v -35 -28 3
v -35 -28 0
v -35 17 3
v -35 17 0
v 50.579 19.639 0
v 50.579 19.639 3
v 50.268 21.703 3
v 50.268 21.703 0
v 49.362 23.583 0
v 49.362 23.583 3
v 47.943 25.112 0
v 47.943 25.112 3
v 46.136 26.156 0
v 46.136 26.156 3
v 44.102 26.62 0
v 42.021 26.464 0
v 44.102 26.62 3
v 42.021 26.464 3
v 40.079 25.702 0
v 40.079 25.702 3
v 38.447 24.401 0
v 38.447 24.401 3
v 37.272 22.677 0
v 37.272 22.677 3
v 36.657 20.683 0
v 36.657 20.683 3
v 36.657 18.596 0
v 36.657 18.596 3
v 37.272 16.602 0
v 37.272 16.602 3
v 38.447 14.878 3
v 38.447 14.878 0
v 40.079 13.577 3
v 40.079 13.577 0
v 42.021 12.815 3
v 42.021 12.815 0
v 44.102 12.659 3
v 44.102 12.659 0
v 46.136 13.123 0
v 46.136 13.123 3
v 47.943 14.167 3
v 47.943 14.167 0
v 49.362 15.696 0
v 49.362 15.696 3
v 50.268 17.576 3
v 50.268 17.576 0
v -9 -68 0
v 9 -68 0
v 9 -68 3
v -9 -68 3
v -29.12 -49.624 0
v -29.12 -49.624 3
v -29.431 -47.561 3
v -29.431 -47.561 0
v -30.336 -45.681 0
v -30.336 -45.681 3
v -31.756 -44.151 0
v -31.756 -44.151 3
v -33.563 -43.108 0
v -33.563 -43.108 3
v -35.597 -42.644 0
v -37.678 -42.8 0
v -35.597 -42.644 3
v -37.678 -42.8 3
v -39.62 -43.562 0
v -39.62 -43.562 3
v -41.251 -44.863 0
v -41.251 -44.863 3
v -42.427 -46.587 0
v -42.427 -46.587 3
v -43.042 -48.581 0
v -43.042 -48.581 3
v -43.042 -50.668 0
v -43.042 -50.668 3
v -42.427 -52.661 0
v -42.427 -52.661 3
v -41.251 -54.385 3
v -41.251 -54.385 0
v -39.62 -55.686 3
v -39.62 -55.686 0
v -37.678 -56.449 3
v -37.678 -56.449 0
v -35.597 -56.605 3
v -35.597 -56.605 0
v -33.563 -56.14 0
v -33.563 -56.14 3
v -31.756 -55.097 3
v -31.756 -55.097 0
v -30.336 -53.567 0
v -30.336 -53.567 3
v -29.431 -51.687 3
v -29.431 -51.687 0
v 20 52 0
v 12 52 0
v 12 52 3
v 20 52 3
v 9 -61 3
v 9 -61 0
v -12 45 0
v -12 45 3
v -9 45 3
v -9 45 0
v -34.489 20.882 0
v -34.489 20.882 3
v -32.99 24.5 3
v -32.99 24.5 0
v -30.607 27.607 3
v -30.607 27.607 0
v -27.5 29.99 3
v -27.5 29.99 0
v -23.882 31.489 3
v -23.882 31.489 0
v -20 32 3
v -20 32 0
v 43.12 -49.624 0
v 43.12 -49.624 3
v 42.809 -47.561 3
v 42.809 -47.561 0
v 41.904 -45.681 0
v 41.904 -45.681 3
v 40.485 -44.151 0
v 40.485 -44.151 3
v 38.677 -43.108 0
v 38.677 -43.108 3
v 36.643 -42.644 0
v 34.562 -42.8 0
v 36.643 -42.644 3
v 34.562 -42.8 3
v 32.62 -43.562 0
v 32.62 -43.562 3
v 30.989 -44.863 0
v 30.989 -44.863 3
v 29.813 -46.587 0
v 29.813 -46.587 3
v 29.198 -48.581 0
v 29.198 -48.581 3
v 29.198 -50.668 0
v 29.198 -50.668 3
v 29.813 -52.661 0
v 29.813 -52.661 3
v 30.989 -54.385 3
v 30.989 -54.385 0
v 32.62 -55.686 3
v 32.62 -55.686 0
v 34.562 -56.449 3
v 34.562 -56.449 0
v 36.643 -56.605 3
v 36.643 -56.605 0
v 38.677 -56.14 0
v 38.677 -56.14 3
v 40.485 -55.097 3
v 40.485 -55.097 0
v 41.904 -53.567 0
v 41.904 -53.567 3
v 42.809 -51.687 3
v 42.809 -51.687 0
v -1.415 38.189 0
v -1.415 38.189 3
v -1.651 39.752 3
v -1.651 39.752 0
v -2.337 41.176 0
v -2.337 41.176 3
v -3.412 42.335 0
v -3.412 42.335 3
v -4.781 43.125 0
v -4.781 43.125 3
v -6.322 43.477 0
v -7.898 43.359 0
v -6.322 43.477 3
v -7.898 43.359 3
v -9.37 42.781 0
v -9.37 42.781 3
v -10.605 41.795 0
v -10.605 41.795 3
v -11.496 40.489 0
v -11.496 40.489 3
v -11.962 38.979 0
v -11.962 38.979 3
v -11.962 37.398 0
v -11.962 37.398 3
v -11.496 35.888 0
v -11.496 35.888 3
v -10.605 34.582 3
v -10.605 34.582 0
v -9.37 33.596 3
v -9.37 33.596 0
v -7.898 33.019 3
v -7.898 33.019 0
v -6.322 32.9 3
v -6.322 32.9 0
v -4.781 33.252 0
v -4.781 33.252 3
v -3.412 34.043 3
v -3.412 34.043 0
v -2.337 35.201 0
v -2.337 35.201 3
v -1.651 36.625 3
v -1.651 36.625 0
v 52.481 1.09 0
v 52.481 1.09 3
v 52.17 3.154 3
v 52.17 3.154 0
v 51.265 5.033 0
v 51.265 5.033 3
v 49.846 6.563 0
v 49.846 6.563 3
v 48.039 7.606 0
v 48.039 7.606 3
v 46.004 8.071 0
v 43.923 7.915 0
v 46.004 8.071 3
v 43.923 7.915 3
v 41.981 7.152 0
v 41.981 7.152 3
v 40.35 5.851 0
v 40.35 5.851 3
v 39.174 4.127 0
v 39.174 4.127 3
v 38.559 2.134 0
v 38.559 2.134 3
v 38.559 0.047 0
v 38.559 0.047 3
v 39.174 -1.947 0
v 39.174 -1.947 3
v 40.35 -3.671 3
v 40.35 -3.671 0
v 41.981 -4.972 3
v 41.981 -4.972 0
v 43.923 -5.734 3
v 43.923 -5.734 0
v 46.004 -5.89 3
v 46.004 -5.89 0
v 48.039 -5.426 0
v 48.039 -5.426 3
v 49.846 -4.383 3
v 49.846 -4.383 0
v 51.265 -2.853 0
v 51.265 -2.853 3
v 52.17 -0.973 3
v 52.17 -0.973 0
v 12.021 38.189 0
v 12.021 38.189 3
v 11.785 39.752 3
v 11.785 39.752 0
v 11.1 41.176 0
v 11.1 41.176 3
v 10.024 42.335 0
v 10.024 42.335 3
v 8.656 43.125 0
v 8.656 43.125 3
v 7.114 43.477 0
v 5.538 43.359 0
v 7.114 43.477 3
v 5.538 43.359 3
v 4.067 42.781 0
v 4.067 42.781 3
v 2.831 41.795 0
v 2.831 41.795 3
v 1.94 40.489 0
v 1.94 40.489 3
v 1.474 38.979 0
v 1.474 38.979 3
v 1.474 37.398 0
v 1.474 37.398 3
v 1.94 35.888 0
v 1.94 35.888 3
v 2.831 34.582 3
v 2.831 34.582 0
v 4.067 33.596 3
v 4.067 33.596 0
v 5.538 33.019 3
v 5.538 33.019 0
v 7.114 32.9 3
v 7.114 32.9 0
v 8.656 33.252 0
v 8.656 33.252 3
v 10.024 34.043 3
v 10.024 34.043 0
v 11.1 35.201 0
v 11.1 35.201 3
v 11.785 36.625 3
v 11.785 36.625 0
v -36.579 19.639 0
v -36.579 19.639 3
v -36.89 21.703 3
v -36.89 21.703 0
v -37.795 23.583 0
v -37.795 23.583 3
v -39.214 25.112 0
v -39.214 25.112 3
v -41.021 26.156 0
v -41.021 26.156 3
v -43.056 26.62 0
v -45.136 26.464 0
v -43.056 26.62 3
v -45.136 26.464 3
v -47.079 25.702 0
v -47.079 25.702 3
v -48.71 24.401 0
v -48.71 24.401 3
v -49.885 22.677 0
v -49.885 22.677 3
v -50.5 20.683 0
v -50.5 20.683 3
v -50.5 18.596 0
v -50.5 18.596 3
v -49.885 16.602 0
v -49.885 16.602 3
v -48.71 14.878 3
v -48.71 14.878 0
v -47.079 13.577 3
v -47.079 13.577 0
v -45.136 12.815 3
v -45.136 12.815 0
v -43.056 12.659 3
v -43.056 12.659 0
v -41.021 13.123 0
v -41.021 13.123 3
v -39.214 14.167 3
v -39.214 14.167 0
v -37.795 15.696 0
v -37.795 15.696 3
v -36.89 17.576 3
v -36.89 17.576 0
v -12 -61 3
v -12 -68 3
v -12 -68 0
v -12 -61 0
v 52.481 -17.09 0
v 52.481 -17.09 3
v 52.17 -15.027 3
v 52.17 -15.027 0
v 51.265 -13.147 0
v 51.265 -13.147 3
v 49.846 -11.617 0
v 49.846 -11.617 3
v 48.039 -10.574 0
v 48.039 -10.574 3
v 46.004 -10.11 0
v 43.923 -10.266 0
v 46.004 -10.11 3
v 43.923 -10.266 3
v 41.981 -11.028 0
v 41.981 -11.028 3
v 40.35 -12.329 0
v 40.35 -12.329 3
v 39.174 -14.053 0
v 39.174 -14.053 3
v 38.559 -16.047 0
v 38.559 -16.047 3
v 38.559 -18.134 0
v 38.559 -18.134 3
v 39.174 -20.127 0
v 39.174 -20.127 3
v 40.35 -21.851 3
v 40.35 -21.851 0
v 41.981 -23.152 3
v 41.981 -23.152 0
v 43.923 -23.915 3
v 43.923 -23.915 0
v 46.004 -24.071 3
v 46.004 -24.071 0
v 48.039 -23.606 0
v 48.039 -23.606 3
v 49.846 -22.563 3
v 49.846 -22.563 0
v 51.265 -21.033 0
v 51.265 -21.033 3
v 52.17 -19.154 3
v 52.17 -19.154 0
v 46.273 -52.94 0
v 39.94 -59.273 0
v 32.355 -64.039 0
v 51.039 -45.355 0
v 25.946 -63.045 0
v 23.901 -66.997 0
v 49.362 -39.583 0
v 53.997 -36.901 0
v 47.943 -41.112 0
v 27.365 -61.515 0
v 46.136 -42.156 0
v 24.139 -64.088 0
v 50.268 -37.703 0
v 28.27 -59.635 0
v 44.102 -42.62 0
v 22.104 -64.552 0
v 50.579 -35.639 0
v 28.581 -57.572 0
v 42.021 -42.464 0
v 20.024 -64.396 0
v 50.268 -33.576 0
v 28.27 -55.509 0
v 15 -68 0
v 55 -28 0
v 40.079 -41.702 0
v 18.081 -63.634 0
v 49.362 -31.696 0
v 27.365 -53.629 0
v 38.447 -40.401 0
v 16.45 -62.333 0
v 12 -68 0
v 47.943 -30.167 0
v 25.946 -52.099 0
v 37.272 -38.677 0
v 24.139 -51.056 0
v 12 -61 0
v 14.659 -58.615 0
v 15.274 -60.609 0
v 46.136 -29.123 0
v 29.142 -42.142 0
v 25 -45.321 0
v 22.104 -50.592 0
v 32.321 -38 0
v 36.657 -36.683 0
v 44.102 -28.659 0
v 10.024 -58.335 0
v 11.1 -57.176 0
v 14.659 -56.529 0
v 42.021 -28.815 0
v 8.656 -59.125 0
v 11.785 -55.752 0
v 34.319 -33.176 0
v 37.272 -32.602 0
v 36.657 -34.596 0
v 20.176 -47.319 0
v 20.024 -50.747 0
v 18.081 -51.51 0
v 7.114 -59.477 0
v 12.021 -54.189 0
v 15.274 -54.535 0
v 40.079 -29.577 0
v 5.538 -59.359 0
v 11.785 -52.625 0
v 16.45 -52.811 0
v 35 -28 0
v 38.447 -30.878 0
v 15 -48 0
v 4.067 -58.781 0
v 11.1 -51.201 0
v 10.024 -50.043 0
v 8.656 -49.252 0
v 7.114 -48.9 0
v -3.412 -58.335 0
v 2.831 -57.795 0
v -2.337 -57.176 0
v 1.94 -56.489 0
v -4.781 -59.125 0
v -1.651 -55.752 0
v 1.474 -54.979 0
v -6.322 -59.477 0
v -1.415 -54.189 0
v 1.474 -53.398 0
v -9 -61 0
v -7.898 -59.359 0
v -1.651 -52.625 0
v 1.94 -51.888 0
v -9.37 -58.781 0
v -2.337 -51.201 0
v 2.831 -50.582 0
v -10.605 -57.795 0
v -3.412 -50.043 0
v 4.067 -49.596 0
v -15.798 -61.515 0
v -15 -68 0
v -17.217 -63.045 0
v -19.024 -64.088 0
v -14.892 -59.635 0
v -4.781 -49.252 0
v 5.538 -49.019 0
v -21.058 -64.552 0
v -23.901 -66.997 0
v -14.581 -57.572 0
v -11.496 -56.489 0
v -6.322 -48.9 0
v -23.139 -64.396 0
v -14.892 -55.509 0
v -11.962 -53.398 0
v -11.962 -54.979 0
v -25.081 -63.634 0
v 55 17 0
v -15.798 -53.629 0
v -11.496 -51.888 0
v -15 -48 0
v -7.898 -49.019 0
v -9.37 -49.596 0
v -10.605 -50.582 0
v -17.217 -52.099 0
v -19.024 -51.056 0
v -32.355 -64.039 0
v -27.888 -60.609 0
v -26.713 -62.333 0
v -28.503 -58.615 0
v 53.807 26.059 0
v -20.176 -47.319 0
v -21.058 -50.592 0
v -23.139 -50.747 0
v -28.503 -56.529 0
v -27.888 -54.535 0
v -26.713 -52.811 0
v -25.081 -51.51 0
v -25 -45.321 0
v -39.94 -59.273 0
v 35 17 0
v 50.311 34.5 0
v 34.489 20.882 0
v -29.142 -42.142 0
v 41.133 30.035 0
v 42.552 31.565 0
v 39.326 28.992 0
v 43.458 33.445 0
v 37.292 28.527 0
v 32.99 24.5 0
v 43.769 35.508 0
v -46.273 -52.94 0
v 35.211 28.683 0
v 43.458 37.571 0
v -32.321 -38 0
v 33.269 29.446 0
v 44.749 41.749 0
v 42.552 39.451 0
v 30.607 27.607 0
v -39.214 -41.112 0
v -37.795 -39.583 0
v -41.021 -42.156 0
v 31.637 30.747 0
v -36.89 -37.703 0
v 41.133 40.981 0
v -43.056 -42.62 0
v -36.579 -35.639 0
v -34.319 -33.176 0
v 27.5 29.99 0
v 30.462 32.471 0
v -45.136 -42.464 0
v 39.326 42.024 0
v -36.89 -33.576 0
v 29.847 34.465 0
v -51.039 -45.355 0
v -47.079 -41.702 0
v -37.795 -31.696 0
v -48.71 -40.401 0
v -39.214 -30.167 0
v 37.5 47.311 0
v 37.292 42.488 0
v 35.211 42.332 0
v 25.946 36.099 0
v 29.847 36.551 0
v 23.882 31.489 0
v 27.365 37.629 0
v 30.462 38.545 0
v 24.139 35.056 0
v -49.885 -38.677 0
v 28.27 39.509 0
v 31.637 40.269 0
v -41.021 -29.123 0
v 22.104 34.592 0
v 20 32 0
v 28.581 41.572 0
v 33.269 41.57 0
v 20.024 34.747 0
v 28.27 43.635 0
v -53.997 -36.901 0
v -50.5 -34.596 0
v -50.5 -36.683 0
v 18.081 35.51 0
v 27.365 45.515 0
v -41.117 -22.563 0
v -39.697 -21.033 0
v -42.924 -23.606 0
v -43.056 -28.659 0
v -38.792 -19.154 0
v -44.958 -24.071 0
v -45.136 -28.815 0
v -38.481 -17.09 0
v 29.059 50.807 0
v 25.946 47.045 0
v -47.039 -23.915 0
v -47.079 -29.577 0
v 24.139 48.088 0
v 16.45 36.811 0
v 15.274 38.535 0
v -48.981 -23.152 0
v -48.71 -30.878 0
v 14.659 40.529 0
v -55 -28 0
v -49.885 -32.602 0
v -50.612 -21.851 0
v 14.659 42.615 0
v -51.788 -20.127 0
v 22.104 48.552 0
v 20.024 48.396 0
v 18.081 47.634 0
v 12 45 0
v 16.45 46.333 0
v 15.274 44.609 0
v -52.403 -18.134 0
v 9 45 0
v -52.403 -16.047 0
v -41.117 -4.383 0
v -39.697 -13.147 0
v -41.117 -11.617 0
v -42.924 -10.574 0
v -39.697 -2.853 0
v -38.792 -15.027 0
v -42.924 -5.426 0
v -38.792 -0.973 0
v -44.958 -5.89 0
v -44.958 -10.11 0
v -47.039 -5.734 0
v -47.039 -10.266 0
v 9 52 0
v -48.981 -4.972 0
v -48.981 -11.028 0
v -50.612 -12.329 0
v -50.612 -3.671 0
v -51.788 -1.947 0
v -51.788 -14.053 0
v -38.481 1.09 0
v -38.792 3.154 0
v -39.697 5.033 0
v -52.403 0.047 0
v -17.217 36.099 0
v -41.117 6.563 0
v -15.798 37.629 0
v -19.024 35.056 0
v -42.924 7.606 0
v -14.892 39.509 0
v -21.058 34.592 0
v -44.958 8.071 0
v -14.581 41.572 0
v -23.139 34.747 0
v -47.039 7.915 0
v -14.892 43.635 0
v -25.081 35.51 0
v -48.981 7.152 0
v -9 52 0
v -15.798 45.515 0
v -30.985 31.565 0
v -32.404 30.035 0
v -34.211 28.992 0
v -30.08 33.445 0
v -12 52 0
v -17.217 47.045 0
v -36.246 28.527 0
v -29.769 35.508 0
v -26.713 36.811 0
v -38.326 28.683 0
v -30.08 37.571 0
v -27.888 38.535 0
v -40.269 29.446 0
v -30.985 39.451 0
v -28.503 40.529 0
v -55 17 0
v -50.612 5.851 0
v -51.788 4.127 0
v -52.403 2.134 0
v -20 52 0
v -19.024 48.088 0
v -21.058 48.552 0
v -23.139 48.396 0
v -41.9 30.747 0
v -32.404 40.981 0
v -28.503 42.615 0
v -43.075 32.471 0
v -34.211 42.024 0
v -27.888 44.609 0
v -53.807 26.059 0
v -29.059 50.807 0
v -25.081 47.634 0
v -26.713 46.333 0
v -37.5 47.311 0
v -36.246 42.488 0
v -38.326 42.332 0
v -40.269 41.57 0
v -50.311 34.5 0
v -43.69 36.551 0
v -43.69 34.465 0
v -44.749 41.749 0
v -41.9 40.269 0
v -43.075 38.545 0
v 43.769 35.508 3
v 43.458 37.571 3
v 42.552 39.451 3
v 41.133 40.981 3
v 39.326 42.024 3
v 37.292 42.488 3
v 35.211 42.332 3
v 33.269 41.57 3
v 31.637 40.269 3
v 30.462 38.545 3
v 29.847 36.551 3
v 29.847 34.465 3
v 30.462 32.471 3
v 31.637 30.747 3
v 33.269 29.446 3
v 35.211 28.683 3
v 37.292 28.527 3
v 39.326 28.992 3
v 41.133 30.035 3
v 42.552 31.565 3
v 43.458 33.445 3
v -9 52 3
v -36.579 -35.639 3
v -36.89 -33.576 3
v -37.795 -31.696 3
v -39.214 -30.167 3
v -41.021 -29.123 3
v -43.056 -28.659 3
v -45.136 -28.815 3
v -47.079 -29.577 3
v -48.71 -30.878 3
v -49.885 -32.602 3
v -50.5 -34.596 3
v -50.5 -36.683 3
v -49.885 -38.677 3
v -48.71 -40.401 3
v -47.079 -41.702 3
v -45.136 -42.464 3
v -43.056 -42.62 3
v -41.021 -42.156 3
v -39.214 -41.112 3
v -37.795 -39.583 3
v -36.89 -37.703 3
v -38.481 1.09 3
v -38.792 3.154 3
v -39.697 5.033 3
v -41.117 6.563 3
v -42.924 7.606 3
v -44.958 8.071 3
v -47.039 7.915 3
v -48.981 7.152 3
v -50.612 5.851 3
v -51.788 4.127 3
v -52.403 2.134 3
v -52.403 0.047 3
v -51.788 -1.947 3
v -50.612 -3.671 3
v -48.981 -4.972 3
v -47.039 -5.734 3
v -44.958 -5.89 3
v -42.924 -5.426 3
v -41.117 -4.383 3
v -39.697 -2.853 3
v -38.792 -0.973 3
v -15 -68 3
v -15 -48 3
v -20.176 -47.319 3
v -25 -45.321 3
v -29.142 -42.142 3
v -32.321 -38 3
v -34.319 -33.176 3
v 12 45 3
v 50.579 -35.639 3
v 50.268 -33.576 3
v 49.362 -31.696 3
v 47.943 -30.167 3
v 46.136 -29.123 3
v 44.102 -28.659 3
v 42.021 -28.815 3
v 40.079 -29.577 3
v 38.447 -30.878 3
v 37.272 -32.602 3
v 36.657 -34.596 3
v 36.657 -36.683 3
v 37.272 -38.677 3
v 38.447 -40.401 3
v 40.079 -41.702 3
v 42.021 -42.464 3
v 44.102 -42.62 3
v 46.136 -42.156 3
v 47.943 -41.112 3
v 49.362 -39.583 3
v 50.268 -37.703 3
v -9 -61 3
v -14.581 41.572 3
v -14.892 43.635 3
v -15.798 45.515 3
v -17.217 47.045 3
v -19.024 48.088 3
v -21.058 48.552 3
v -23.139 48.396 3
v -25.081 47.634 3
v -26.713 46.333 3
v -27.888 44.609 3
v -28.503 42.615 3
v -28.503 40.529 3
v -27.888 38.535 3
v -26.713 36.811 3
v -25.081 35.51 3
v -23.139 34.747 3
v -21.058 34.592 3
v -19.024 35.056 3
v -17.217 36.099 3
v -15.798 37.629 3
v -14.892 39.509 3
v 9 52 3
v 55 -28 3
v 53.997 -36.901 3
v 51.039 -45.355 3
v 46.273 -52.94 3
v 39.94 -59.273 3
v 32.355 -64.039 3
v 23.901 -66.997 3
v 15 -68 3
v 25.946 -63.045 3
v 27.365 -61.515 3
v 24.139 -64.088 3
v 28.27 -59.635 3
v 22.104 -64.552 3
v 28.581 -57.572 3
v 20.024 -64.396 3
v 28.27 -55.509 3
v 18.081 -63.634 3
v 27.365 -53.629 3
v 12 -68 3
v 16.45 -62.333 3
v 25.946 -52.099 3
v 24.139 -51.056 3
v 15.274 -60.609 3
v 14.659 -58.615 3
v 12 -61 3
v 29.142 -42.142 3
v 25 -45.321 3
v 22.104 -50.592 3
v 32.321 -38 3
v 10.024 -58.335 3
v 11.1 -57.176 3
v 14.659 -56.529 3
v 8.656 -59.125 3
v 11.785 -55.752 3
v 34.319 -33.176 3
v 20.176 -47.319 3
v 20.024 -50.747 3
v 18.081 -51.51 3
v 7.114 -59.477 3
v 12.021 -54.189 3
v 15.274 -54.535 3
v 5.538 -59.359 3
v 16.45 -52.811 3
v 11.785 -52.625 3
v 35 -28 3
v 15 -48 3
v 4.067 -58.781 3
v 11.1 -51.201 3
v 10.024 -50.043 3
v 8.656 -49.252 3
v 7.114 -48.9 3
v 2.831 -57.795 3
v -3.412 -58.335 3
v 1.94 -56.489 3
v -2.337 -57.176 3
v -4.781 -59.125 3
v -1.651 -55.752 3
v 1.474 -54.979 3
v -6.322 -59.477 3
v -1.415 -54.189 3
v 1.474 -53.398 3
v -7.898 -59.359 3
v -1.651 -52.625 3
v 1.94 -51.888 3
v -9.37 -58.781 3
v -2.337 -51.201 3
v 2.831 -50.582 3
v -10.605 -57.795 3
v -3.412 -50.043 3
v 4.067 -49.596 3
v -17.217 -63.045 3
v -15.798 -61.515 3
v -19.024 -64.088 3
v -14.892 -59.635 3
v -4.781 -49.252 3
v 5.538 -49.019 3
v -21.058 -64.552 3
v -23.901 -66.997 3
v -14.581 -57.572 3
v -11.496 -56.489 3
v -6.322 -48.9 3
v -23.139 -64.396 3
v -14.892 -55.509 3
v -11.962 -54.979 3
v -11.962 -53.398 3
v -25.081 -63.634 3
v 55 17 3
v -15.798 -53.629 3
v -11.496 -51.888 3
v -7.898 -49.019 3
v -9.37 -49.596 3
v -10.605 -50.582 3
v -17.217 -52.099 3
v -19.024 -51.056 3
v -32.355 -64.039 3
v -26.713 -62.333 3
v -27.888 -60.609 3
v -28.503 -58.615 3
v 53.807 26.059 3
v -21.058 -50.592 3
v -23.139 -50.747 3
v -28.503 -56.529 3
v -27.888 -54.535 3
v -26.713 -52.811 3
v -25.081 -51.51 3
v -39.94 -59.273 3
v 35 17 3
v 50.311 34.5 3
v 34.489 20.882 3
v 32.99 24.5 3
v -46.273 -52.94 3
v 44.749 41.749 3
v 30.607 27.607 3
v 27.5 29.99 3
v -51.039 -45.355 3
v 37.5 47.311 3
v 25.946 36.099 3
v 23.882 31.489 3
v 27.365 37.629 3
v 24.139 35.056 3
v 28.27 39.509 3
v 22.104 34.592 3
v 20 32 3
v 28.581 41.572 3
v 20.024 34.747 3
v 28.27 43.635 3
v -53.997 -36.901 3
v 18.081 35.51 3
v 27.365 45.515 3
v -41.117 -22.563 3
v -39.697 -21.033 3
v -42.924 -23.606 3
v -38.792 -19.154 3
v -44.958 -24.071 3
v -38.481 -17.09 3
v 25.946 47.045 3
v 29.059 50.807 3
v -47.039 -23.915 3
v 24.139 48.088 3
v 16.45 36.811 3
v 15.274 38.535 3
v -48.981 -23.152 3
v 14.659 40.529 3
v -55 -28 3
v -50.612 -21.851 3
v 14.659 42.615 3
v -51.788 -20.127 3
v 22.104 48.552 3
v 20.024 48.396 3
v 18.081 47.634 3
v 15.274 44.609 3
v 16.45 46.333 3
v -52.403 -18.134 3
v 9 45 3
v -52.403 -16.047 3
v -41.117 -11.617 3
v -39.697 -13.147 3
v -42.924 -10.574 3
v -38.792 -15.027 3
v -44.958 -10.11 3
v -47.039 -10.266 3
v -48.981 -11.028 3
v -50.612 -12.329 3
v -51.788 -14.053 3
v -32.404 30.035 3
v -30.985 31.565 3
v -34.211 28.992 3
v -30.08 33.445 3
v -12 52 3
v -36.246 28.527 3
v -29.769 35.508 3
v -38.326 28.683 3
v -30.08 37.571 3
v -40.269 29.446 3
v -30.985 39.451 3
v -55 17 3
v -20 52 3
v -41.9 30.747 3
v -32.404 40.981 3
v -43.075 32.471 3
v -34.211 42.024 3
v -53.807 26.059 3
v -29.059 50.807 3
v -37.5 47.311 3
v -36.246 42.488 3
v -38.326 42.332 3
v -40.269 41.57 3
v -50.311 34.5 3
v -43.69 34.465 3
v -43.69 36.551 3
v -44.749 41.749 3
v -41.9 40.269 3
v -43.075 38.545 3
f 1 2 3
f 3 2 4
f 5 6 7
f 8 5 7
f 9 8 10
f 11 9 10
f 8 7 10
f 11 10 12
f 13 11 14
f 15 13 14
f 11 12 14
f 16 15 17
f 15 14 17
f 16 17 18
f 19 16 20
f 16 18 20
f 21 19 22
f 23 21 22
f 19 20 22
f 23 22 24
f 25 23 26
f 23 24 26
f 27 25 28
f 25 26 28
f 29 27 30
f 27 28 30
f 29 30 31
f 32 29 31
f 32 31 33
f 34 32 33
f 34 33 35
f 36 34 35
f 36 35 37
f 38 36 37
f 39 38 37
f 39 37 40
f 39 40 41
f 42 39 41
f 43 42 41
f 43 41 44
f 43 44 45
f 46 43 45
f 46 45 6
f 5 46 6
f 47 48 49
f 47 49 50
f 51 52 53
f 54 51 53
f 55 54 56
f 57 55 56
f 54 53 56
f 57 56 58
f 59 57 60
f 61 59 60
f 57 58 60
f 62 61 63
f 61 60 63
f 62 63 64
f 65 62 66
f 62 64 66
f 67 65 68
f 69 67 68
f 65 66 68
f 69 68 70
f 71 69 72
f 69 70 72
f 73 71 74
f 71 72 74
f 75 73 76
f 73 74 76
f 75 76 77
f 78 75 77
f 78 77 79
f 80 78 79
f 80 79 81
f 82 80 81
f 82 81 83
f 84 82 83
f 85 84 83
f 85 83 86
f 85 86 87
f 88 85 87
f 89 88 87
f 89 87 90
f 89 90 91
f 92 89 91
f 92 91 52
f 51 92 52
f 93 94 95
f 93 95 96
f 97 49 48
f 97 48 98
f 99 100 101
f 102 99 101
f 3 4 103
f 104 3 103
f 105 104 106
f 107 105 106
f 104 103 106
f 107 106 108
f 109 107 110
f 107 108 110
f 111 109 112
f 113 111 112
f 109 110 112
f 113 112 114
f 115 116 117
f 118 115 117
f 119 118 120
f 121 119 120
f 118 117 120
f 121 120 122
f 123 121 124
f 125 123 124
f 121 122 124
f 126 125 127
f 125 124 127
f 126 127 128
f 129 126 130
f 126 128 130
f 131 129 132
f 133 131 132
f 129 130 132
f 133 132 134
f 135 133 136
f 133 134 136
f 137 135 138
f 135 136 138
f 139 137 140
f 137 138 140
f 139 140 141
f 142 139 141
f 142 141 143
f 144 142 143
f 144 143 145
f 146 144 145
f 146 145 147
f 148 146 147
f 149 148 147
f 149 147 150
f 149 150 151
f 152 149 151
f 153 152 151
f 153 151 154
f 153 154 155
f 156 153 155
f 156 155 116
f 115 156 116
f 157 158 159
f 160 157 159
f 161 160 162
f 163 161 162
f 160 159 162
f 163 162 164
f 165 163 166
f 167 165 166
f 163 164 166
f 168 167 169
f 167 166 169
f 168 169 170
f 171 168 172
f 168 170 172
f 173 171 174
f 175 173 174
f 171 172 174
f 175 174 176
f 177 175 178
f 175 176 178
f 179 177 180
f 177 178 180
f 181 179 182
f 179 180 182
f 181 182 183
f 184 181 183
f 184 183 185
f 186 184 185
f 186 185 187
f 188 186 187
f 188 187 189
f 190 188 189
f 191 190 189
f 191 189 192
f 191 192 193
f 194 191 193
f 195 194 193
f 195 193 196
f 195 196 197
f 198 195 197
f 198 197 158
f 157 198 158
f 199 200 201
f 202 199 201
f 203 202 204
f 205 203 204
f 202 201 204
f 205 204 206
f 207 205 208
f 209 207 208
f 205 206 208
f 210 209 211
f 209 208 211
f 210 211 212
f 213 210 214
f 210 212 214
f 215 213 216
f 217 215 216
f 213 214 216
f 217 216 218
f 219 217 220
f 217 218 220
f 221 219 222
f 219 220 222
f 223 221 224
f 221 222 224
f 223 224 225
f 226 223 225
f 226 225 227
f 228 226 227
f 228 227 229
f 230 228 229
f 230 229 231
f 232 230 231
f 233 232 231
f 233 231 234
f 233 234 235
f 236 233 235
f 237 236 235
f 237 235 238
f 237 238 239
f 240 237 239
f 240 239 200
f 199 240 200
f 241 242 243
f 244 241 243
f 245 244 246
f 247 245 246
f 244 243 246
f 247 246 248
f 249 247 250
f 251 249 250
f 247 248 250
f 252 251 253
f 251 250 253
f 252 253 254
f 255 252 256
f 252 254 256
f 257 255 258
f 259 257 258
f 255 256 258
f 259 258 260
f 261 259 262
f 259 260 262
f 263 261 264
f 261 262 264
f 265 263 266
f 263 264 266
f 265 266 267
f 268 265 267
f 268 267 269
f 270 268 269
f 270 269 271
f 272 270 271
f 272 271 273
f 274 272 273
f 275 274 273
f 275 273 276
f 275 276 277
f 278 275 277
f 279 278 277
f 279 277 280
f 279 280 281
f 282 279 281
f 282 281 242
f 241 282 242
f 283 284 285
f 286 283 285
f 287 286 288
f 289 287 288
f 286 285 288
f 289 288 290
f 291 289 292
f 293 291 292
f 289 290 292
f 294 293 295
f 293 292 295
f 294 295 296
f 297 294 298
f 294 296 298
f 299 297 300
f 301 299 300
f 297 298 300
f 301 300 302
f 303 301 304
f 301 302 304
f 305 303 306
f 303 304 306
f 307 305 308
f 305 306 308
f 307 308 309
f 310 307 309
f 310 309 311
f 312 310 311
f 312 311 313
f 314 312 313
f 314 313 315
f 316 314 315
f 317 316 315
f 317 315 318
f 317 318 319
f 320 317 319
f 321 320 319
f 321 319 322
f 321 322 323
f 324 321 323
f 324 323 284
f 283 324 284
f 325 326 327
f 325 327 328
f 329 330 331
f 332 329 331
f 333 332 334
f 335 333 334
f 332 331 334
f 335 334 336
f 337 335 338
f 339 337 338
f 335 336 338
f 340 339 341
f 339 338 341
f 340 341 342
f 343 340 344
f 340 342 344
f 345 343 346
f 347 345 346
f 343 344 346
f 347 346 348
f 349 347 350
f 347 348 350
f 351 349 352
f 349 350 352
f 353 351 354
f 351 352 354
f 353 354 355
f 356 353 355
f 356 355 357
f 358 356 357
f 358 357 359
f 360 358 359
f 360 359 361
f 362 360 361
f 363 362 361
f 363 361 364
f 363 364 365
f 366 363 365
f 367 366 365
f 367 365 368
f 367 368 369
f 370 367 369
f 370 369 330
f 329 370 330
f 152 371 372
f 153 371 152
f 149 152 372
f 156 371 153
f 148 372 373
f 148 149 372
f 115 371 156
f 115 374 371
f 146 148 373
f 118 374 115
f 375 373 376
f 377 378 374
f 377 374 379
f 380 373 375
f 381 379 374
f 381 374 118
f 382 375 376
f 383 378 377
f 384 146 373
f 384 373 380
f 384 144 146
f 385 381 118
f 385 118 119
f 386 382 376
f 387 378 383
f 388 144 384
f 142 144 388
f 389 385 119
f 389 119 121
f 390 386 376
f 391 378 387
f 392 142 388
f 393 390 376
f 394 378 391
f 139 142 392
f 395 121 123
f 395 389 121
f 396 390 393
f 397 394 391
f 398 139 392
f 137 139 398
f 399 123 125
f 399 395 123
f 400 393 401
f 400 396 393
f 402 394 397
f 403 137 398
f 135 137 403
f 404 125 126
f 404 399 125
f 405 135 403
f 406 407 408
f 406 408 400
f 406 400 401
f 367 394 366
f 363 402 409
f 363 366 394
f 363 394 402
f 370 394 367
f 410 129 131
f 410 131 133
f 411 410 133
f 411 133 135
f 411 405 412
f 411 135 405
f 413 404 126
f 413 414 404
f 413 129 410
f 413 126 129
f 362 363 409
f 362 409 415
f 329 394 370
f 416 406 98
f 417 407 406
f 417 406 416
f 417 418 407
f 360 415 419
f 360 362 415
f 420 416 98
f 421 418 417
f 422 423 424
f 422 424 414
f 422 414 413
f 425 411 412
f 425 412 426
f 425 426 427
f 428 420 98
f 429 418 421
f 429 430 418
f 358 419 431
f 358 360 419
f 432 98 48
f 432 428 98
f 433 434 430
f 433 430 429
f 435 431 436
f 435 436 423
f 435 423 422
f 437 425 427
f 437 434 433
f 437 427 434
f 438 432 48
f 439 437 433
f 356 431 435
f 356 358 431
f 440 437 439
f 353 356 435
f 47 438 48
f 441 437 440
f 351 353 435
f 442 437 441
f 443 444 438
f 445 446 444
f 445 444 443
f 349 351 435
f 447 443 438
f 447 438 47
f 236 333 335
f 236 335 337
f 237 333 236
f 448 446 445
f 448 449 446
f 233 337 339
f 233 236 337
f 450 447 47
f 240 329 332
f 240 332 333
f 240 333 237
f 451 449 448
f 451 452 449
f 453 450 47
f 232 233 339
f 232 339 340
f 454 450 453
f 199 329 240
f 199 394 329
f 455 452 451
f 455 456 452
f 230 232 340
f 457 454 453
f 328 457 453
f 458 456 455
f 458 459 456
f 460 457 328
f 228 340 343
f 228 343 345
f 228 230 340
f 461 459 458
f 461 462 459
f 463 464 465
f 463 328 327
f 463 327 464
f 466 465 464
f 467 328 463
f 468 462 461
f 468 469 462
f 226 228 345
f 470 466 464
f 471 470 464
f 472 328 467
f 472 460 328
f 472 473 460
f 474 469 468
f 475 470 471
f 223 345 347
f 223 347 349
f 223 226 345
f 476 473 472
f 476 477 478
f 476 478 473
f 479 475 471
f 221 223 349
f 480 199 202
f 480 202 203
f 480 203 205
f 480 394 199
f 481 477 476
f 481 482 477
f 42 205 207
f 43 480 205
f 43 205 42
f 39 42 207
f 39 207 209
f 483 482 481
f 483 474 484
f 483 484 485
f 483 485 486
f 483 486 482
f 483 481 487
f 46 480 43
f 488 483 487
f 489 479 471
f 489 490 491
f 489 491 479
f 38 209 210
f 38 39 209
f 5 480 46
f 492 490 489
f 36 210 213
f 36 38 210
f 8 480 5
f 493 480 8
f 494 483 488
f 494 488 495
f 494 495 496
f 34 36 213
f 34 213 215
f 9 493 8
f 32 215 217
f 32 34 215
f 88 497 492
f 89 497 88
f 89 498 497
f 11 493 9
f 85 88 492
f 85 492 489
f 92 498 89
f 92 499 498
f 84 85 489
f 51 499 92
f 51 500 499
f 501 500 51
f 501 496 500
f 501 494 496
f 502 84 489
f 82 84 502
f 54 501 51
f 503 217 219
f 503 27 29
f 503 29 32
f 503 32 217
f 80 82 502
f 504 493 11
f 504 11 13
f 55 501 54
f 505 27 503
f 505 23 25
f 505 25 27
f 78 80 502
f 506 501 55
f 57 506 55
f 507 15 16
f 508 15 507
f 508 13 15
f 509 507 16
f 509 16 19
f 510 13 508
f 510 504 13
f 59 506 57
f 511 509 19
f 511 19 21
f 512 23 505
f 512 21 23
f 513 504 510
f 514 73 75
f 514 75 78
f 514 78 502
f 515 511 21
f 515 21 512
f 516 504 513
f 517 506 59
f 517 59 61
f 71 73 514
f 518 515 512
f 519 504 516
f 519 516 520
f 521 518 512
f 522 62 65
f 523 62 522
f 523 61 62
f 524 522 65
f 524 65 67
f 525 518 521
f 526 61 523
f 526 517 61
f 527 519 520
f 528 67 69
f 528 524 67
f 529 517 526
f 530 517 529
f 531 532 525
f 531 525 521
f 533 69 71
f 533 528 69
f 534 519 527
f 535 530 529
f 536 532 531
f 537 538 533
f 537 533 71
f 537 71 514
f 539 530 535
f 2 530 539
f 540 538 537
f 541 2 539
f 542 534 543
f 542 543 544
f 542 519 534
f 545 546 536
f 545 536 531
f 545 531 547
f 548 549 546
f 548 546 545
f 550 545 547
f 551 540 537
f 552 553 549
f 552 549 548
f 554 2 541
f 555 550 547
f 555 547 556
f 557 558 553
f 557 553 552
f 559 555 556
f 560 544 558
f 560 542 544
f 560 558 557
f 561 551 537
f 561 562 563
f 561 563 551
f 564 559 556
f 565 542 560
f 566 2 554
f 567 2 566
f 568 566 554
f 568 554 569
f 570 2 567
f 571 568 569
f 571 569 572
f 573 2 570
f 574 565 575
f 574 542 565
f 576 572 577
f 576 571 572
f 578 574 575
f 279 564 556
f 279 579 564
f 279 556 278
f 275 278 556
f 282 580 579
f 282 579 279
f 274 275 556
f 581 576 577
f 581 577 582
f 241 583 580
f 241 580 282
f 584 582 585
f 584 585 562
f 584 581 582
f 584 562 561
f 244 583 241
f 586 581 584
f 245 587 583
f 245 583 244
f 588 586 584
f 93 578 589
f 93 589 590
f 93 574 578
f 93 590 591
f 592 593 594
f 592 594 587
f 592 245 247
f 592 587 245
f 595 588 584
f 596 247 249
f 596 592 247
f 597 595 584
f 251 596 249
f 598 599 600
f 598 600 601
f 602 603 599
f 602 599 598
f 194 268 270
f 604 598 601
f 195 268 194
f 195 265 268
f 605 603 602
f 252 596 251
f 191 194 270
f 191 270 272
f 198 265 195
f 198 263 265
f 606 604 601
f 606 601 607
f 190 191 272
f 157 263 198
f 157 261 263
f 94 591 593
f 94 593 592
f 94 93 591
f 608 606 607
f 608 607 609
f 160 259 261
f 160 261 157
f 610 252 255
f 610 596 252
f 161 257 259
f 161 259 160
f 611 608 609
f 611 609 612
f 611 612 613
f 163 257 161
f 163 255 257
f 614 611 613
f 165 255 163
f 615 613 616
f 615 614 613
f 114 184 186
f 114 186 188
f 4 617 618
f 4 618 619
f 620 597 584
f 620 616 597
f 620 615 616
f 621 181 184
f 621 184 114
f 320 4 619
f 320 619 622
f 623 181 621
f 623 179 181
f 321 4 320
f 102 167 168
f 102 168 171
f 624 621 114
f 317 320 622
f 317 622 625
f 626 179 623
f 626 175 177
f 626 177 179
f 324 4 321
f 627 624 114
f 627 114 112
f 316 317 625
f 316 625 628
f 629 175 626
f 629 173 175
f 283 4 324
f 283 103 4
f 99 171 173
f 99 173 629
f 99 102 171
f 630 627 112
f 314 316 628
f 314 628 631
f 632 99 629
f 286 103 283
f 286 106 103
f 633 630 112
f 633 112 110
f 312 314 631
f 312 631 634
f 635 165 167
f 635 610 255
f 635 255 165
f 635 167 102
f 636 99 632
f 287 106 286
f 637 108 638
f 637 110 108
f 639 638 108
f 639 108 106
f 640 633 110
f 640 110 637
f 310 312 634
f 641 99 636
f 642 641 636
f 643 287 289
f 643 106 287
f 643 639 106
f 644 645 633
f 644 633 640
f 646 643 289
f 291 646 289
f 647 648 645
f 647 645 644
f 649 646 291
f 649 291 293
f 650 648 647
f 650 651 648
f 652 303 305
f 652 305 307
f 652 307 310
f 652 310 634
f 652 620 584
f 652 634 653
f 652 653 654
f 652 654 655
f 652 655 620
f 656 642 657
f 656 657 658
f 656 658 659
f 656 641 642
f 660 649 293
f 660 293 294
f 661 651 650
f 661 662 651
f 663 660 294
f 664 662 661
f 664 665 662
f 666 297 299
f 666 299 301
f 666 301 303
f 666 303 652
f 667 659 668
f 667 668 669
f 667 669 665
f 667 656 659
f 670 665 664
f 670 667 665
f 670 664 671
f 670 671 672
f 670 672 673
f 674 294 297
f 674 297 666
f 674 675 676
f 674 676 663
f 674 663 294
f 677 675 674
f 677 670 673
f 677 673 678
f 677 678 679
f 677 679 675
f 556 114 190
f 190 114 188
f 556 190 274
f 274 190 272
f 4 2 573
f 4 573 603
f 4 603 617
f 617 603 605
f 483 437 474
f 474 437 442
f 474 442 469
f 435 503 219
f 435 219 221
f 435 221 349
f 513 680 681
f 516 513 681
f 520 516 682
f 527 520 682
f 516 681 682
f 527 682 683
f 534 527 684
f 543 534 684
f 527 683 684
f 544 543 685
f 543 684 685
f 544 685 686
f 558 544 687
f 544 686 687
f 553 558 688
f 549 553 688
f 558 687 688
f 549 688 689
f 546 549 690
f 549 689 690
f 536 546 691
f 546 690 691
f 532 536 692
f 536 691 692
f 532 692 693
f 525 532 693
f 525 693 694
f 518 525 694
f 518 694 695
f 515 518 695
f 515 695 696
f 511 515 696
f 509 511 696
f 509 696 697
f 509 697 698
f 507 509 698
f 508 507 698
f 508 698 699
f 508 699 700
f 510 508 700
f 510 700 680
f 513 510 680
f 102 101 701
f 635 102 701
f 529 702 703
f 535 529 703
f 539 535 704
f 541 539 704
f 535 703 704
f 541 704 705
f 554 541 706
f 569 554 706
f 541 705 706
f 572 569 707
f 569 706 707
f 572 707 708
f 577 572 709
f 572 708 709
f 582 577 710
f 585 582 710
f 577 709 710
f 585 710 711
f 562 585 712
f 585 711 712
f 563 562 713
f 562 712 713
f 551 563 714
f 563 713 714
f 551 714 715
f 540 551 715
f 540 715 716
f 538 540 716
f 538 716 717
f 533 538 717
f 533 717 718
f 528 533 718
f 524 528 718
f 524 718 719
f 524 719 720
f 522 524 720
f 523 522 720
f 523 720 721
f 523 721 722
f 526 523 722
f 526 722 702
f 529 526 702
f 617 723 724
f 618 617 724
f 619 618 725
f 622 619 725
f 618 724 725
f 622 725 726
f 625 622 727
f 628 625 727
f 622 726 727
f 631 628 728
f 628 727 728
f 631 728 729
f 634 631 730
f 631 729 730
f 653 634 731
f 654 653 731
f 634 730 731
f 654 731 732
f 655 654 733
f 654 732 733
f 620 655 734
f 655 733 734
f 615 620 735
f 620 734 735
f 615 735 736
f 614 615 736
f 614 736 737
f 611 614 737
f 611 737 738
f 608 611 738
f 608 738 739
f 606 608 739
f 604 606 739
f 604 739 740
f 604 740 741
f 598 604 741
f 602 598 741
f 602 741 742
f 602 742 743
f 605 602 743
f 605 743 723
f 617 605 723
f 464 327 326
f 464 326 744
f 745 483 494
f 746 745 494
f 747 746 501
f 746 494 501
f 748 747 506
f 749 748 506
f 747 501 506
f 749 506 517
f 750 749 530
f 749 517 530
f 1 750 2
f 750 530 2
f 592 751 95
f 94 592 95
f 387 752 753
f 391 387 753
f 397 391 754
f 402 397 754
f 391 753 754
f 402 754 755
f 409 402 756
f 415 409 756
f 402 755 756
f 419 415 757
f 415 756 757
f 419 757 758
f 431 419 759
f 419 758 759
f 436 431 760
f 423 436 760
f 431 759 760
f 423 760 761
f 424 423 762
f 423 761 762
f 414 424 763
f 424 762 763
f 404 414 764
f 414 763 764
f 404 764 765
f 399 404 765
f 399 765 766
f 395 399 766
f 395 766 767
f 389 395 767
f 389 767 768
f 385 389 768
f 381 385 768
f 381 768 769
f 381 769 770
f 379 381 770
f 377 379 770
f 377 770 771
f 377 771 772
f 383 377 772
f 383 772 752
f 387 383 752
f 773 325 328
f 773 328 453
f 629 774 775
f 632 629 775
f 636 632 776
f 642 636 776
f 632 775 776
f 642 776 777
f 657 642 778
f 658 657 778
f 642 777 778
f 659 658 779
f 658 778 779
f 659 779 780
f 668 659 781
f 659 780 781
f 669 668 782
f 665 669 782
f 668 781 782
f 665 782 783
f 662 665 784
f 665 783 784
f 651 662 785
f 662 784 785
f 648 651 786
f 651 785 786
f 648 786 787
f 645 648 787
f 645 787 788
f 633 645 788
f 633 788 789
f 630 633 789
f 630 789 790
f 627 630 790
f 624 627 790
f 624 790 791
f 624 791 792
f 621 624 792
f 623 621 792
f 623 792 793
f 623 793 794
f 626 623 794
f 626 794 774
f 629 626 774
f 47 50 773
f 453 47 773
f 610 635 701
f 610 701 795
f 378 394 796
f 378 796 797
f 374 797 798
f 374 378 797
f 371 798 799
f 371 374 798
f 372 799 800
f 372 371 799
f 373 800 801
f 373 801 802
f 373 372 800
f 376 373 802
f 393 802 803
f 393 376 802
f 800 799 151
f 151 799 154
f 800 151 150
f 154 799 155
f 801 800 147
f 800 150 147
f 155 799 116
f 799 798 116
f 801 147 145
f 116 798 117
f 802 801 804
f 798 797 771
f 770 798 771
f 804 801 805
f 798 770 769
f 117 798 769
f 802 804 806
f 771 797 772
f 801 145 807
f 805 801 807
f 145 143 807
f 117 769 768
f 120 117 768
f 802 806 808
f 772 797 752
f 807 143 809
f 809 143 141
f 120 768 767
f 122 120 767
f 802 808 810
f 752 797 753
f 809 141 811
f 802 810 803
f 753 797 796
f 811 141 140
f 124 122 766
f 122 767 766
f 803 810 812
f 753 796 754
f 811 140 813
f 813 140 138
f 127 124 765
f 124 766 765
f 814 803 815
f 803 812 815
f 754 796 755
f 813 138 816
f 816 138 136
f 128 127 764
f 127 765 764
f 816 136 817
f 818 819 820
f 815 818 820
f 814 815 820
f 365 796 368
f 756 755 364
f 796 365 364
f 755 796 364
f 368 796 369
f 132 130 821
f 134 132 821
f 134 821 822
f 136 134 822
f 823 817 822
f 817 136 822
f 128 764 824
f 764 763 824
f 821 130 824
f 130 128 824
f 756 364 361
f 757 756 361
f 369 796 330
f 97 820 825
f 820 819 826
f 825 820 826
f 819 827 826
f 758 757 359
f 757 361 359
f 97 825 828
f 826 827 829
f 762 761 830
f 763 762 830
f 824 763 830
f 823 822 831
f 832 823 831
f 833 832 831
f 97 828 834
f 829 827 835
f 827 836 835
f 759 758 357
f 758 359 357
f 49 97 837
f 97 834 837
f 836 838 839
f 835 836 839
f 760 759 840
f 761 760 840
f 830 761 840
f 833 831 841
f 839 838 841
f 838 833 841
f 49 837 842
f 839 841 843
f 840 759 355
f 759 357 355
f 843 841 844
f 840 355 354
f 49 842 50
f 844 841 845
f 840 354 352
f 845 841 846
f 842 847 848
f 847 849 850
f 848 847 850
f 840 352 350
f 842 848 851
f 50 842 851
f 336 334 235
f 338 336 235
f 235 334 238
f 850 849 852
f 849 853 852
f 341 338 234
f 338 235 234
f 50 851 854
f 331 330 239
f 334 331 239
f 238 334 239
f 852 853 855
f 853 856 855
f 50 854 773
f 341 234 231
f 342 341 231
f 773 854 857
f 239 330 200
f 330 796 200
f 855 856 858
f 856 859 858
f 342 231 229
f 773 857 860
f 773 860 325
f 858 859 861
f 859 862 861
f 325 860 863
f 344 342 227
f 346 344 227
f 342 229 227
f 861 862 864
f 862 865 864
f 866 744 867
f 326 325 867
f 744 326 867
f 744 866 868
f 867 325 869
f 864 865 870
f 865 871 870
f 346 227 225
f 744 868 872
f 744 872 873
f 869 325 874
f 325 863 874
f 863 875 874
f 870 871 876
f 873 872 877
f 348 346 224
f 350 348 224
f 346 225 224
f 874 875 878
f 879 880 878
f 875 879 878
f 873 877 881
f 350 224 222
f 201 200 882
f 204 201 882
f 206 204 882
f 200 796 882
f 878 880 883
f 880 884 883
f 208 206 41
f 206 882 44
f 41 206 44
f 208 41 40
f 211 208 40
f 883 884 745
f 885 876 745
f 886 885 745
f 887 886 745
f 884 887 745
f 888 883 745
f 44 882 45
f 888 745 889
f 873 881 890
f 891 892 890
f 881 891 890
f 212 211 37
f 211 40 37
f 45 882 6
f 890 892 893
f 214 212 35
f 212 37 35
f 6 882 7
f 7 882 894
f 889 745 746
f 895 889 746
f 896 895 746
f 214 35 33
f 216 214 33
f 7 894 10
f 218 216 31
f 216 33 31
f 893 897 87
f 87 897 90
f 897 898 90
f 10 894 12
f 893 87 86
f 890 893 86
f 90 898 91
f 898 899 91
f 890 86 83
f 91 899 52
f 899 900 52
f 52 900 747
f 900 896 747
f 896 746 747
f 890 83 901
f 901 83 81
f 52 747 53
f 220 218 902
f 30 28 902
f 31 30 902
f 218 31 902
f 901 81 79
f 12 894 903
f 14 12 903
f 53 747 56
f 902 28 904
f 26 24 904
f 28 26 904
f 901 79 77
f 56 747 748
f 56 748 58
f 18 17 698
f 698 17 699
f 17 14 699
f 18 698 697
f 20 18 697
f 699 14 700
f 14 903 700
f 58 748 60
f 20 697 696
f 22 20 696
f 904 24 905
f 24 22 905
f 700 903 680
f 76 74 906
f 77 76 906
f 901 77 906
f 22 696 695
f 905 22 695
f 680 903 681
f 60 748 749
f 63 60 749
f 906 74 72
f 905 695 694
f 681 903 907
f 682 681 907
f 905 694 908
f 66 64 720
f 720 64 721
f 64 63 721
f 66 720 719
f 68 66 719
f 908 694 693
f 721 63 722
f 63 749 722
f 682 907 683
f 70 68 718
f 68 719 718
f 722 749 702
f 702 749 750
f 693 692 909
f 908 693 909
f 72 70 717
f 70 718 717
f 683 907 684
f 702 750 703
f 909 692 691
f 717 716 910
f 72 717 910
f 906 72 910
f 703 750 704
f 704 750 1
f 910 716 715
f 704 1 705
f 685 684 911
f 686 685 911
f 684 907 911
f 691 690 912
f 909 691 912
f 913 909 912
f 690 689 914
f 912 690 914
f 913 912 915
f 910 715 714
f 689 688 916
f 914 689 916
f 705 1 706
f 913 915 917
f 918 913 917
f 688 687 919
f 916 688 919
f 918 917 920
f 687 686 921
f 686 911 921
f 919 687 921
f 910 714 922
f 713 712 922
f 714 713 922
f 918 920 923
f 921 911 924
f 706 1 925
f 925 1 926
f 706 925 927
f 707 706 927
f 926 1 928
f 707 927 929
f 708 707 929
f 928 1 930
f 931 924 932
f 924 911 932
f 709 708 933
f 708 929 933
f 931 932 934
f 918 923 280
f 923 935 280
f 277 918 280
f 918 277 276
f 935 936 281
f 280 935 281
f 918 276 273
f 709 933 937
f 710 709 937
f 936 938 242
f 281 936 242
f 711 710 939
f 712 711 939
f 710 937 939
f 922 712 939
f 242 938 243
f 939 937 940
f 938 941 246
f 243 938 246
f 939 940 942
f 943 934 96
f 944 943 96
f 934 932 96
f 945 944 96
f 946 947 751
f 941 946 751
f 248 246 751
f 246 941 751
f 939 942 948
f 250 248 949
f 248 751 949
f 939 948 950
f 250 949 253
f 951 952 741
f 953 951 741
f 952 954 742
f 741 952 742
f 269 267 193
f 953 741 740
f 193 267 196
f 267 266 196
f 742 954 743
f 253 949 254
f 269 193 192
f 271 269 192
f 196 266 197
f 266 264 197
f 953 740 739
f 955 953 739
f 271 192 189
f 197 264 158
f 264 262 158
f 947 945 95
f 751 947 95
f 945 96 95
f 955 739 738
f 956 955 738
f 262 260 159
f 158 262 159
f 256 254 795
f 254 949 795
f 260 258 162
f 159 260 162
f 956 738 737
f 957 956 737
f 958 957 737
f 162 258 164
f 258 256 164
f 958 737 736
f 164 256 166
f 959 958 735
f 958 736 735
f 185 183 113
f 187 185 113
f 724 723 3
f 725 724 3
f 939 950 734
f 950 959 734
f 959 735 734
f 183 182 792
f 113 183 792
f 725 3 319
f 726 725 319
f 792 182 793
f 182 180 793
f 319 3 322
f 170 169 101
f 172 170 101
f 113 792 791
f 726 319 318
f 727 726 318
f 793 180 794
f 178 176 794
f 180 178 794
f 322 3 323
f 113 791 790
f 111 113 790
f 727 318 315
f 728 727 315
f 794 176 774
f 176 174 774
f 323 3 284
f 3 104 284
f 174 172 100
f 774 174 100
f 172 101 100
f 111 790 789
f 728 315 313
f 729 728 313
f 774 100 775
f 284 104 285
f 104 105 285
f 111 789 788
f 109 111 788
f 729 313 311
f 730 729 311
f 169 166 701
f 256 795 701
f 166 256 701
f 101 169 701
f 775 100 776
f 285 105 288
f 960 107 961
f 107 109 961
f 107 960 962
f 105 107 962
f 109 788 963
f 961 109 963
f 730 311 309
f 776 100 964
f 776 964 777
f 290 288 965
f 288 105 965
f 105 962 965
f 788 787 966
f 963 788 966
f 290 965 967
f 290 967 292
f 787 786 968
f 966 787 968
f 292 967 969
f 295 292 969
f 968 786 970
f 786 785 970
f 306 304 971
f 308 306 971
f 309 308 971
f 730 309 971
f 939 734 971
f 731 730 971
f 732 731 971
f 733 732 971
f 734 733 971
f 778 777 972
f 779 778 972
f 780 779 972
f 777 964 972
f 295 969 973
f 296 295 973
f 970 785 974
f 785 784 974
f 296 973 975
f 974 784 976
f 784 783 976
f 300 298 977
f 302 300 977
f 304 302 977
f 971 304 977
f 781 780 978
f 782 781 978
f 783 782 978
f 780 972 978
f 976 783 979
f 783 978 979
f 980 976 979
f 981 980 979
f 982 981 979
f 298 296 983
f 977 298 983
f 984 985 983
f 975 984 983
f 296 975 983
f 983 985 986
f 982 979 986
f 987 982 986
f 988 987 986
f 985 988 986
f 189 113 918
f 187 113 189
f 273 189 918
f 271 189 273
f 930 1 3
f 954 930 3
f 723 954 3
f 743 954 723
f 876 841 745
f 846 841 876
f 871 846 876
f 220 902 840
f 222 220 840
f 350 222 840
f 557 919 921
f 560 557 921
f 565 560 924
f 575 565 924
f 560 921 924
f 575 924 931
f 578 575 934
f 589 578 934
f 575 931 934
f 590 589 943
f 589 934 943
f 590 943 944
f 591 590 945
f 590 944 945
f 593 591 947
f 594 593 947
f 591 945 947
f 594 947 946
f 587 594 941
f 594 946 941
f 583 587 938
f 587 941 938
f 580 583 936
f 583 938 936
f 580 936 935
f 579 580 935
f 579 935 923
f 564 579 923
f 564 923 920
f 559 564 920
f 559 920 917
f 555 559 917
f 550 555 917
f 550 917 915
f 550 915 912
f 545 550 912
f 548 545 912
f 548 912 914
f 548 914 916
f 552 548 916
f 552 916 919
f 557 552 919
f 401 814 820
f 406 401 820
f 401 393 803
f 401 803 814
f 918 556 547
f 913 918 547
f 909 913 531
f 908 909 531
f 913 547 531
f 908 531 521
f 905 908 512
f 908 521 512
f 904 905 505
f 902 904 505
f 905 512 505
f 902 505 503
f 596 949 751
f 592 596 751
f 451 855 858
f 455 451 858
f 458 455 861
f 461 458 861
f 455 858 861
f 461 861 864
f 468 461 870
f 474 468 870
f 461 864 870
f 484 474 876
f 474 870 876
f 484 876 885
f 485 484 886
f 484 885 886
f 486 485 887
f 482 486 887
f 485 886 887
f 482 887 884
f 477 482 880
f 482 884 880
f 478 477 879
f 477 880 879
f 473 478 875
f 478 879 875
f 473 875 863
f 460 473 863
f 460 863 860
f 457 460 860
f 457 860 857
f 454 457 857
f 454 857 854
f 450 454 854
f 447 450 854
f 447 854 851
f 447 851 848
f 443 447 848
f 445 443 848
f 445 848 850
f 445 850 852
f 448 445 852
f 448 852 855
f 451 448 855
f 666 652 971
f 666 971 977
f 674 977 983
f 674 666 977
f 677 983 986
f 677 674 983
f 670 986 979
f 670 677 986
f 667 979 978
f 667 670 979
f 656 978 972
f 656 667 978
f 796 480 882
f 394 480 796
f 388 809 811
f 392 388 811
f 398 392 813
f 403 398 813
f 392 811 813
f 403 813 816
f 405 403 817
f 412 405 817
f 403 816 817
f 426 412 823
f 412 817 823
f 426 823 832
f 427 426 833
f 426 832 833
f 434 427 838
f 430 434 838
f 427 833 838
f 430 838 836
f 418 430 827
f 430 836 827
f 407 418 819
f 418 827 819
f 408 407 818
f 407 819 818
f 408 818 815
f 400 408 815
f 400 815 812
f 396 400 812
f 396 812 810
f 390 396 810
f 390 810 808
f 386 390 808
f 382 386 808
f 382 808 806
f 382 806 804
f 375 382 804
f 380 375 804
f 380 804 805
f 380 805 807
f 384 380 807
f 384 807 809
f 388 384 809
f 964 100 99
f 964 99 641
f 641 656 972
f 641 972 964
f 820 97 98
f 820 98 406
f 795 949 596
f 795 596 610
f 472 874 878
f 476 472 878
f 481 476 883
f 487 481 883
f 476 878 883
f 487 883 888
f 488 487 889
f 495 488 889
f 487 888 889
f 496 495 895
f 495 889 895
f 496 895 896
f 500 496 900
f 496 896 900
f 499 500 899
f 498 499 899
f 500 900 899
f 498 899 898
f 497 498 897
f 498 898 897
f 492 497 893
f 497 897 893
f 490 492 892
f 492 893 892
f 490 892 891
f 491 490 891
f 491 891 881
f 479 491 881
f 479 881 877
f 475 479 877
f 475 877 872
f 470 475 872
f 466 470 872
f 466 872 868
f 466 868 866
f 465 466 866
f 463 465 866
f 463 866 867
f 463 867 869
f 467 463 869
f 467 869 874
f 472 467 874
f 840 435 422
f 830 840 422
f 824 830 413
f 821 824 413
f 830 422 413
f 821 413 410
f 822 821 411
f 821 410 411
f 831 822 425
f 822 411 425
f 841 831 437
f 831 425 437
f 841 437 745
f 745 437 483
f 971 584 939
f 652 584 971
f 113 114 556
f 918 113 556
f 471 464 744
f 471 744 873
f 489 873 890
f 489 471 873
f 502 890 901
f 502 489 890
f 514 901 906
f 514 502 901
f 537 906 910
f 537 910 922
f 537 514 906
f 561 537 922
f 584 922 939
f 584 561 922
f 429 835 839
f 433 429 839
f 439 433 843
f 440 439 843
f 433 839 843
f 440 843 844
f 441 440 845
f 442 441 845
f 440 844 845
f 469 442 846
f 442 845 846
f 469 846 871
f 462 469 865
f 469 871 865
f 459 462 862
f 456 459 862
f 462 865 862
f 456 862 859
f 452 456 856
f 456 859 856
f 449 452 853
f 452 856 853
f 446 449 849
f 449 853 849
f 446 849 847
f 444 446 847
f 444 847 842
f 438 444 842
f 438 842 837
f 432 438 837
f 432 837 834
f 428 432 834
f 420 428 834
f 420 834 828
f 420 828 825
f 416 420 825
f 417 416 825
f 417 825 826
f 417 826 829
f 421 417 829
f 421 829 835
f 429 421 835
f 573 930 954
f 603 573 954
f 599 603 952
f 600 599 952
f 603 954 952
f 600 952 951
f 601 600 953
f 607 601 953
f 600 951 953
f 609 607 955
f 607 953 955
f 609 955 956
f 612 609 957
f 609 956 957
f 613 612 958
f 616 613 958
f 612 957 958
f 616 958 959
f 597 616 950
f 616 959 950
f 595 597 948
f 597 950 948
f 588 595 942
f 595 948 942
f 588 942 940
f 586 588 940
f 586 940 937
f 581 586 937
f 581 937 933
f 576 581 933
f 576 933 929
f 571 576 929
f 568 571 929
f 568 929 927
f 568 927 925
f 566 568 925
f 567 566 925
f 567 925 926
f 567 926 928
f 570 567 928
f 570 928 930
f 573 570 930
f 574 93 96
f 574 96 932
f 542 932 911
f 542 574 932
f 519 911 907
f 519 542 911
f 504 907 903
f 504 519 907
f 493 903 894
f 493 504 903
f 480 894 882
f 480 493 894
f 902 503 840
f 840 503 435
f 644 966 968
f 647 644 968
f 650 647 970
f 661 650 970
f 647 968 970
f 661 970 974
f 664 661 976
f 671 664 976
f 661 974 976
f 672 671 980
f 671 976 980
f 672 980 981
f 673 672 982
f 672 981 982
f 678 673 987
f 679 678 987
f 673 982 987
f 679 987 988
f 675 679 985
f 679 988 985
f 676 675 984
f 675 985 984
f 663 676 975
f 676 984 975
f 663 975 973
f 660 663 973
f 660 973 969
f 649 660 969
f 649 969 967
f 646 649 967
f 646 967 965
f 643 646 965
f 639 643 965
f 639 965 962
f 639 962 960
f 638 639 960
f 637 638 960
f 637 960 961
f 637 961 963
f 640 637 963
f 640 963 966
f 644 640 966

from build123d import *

# Parameters (mm, degrees)
BOSS_EXTRUDE1_DEPTH = 3
SKETCH2_W           = 3
SKETCH2_H           = 7
CUT_EXTRUDE1_DEPTH  = 10
SKETCH3_R           = 7
SKETCH3_R_2         = 5.302946182
CUT_EXTRUDE2_DEPTH  = 10


with BuildPart() as part:
    # Sketch1 → Boss-Extrude1 (new body)
    with BuildSketch(Plane.XY):
        with BuildLine():
            Line((-20, 52), (20, 52))
            ThreePointArc((20, 52), (44.748737342, 41.748737342), (55, 17))
            Line((55, 17), (55, -28))
            ThreePointArc((55, -28), (43.284271247, -56.284271247), (15, -68))
            Line((15, -68), (0.5, -68))
            Line((0.5, -68), (-0.5, -68))
            Line((-0.5, -68), (-15, -68))
            ThreePointArc((-15, -68), (-43.284271247, -56.284271247), (-55, -28))
            Line((-55, -28), (-55, 17))
            ThreePointArc((-55, 17), (-44.748737342, 41.748737342), (-20, 52))
        make_face()
        with BuildLine():
            Line((-20, 32), (20, 32))
            ThreePointArc((20, 32), (30.606601718, 27.606601718), (35, 17))
            Line((35, 17), (35, -28))
            ThreePointArc((35, -28), (29.142135624, -42.142135624), (15, -48))
            Line((15, -48), (0.5, -48))
            Line((0.5, -48), (-0.5, -48))
            Line((-0.5, -48), (-15, -48))
            ThreePointArc((-15, -48), (-29.142135624, -42.142135624), (-35, -28))
            Line((-35, -28), (-35, 17))
            ThreePointArc((-35, 17), (-30.606601718, 27.606601718), (-20, 32))
        make_face(mode=Mode.SUBTRACT)
    extrude(amount=BOSS_EXTRUDE1_DEPTH)

    # Sketch2 → Cut-Extrude1 (cut)
    with BuildSketch(Plane.XY.offset(3)):
        with Locations((-10.5, 48.5)):
            Rectangle(SKETCH2_W, SKETCH2_H)
        with Locations((-10.5, -64.5)):
            Rectangle(SKETCH2_W, SKETCH2_H)
        with Locations((10.5, -64.5)):
            Rectangle(SKETCH2_W, SKETCH2_H)
        with Locations((10.5, 48.5)):
            Rectangle(SKETCH2_W, SKETCH2_H)
    extrude(amount=-CUT_EXTRUDE1_DEPTH, mode=Mode.SUBTRACT)

    # Sketch3 → Cut-Extrude2 (cut)
    with BuildSketch(Plane.XY.offset(3)):
        with Locations((-45.481132216, 1.090233118)):
            Circle(SKETCH3_R)
        with Locations((-43.578653483, 19.639400767)):
            Circle(SKETCH3_R)
        with Locations((-36.768644381, 35.507802928)):
            Circle(SKETCH3_R)
        with Locations((-21.58124313, 41.57195389)):
            Circle(SKETCH3_R)
        with Locations((-6.718128027, 38.188568416)):
            Circle(SKETCH3_R_2)
        with Locations((-6.718128027, -54.188568416)):
            Circle(SKETCH3_R_2)
        with Locations((-21.58124313, -57.57195389)):
            Circle(SKETCH3_R)
        with Locations((-43.578653483, -35.639400767)):
            Circle(SKETCH3_R)
        with Locations((-45.481132216, -17.090233118)):
            Circle(SKETCH3_R)
        with Locations((45.481132216, -17.090233118)):
            Circle(SKETCH3_R)
        with Locations((43.578653483, -35.639400767)):
            Circle(SKETCH3_R)
        with Locations((21.58124313, -57.57195389)):
            Circle(SKETCH3_R)
        with Locations((6.718128027, -54.188568416)):
            Circle(SKETCH3_R_2)
        with Locations((6.718128027, 38.188568416)):
            Circle(SKETCH3_R_2)
        with Locations((21.58124313, 41.57195389)):
            Circle(SKETCH3_R)
        with Locations((36.768644381, 35.507802928)):
            Circle(SKETCH3_R)
        with Locations((43.578653483, 19.639400767)):
            Circle(SKETCH3_R)
        with Locations((45.481132216, 1.090233118)):
            Circle(SKETCH3_R)
        with Locations((-36.120072086, -49.624208078)):
            Circle(SKETCH3_R)
        with Locations((36.120072086, -49.624208078)):
            Circle(SKETCH3_R)
    extrude(amount=-CUT_EXTRUDE2_DEPTH, mode=Mode.SUBTRACT)


solid = part.part
